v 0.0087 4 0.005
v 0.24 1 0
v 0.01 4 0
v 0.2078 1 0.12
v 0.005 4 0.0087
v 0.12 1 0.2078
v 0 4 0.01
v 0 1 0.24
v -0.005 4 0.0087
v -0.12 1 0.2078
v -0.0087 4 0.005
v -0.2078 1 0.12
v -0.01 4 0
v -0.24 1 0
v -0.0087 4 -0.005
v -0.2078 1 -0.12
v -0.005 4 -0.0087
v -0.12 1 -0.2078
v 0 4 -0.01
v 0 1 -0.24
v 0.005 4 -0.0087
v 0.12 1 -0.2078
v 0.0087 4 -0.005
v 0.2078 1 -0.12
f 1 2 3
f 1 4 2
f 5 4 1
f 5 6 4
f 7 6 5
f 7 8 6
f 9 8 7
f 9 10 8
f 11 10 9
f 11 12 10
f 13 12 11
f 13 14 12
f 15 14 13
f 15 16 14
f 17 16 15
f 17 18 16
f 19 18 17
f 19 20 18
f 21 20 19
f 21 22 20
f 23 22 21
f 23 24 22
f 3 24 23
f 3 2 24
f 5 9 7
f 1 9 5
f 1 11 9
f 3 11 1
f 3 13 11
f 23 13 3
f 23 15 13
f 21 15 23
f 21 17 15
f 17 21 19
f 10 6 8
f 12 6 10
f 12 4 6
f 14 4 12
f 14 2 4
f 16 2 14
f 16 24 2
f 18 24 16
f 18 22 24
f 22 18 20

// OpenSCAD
use <lib.scad>

module chassis() {
	rotate([90,0,0]) union() {
		cyl(0.25, 0.2, 2.0);
		translate([0,0,0.5]) box([1.0, 0.05, 0.5]);
		translate([0,0,-0.5]) box([1.0, 0.05, 0.5]);
		translate([0,0,-0.5]) box([0.05, 1.0, 0.5]);
	};
}

module plume() {
	cyl(0.01, 0.24, 3.0);
}

//chassis($fn=32);
translate([0,2.5,0]) rotate([90,0,0]) plume($fn=12);
